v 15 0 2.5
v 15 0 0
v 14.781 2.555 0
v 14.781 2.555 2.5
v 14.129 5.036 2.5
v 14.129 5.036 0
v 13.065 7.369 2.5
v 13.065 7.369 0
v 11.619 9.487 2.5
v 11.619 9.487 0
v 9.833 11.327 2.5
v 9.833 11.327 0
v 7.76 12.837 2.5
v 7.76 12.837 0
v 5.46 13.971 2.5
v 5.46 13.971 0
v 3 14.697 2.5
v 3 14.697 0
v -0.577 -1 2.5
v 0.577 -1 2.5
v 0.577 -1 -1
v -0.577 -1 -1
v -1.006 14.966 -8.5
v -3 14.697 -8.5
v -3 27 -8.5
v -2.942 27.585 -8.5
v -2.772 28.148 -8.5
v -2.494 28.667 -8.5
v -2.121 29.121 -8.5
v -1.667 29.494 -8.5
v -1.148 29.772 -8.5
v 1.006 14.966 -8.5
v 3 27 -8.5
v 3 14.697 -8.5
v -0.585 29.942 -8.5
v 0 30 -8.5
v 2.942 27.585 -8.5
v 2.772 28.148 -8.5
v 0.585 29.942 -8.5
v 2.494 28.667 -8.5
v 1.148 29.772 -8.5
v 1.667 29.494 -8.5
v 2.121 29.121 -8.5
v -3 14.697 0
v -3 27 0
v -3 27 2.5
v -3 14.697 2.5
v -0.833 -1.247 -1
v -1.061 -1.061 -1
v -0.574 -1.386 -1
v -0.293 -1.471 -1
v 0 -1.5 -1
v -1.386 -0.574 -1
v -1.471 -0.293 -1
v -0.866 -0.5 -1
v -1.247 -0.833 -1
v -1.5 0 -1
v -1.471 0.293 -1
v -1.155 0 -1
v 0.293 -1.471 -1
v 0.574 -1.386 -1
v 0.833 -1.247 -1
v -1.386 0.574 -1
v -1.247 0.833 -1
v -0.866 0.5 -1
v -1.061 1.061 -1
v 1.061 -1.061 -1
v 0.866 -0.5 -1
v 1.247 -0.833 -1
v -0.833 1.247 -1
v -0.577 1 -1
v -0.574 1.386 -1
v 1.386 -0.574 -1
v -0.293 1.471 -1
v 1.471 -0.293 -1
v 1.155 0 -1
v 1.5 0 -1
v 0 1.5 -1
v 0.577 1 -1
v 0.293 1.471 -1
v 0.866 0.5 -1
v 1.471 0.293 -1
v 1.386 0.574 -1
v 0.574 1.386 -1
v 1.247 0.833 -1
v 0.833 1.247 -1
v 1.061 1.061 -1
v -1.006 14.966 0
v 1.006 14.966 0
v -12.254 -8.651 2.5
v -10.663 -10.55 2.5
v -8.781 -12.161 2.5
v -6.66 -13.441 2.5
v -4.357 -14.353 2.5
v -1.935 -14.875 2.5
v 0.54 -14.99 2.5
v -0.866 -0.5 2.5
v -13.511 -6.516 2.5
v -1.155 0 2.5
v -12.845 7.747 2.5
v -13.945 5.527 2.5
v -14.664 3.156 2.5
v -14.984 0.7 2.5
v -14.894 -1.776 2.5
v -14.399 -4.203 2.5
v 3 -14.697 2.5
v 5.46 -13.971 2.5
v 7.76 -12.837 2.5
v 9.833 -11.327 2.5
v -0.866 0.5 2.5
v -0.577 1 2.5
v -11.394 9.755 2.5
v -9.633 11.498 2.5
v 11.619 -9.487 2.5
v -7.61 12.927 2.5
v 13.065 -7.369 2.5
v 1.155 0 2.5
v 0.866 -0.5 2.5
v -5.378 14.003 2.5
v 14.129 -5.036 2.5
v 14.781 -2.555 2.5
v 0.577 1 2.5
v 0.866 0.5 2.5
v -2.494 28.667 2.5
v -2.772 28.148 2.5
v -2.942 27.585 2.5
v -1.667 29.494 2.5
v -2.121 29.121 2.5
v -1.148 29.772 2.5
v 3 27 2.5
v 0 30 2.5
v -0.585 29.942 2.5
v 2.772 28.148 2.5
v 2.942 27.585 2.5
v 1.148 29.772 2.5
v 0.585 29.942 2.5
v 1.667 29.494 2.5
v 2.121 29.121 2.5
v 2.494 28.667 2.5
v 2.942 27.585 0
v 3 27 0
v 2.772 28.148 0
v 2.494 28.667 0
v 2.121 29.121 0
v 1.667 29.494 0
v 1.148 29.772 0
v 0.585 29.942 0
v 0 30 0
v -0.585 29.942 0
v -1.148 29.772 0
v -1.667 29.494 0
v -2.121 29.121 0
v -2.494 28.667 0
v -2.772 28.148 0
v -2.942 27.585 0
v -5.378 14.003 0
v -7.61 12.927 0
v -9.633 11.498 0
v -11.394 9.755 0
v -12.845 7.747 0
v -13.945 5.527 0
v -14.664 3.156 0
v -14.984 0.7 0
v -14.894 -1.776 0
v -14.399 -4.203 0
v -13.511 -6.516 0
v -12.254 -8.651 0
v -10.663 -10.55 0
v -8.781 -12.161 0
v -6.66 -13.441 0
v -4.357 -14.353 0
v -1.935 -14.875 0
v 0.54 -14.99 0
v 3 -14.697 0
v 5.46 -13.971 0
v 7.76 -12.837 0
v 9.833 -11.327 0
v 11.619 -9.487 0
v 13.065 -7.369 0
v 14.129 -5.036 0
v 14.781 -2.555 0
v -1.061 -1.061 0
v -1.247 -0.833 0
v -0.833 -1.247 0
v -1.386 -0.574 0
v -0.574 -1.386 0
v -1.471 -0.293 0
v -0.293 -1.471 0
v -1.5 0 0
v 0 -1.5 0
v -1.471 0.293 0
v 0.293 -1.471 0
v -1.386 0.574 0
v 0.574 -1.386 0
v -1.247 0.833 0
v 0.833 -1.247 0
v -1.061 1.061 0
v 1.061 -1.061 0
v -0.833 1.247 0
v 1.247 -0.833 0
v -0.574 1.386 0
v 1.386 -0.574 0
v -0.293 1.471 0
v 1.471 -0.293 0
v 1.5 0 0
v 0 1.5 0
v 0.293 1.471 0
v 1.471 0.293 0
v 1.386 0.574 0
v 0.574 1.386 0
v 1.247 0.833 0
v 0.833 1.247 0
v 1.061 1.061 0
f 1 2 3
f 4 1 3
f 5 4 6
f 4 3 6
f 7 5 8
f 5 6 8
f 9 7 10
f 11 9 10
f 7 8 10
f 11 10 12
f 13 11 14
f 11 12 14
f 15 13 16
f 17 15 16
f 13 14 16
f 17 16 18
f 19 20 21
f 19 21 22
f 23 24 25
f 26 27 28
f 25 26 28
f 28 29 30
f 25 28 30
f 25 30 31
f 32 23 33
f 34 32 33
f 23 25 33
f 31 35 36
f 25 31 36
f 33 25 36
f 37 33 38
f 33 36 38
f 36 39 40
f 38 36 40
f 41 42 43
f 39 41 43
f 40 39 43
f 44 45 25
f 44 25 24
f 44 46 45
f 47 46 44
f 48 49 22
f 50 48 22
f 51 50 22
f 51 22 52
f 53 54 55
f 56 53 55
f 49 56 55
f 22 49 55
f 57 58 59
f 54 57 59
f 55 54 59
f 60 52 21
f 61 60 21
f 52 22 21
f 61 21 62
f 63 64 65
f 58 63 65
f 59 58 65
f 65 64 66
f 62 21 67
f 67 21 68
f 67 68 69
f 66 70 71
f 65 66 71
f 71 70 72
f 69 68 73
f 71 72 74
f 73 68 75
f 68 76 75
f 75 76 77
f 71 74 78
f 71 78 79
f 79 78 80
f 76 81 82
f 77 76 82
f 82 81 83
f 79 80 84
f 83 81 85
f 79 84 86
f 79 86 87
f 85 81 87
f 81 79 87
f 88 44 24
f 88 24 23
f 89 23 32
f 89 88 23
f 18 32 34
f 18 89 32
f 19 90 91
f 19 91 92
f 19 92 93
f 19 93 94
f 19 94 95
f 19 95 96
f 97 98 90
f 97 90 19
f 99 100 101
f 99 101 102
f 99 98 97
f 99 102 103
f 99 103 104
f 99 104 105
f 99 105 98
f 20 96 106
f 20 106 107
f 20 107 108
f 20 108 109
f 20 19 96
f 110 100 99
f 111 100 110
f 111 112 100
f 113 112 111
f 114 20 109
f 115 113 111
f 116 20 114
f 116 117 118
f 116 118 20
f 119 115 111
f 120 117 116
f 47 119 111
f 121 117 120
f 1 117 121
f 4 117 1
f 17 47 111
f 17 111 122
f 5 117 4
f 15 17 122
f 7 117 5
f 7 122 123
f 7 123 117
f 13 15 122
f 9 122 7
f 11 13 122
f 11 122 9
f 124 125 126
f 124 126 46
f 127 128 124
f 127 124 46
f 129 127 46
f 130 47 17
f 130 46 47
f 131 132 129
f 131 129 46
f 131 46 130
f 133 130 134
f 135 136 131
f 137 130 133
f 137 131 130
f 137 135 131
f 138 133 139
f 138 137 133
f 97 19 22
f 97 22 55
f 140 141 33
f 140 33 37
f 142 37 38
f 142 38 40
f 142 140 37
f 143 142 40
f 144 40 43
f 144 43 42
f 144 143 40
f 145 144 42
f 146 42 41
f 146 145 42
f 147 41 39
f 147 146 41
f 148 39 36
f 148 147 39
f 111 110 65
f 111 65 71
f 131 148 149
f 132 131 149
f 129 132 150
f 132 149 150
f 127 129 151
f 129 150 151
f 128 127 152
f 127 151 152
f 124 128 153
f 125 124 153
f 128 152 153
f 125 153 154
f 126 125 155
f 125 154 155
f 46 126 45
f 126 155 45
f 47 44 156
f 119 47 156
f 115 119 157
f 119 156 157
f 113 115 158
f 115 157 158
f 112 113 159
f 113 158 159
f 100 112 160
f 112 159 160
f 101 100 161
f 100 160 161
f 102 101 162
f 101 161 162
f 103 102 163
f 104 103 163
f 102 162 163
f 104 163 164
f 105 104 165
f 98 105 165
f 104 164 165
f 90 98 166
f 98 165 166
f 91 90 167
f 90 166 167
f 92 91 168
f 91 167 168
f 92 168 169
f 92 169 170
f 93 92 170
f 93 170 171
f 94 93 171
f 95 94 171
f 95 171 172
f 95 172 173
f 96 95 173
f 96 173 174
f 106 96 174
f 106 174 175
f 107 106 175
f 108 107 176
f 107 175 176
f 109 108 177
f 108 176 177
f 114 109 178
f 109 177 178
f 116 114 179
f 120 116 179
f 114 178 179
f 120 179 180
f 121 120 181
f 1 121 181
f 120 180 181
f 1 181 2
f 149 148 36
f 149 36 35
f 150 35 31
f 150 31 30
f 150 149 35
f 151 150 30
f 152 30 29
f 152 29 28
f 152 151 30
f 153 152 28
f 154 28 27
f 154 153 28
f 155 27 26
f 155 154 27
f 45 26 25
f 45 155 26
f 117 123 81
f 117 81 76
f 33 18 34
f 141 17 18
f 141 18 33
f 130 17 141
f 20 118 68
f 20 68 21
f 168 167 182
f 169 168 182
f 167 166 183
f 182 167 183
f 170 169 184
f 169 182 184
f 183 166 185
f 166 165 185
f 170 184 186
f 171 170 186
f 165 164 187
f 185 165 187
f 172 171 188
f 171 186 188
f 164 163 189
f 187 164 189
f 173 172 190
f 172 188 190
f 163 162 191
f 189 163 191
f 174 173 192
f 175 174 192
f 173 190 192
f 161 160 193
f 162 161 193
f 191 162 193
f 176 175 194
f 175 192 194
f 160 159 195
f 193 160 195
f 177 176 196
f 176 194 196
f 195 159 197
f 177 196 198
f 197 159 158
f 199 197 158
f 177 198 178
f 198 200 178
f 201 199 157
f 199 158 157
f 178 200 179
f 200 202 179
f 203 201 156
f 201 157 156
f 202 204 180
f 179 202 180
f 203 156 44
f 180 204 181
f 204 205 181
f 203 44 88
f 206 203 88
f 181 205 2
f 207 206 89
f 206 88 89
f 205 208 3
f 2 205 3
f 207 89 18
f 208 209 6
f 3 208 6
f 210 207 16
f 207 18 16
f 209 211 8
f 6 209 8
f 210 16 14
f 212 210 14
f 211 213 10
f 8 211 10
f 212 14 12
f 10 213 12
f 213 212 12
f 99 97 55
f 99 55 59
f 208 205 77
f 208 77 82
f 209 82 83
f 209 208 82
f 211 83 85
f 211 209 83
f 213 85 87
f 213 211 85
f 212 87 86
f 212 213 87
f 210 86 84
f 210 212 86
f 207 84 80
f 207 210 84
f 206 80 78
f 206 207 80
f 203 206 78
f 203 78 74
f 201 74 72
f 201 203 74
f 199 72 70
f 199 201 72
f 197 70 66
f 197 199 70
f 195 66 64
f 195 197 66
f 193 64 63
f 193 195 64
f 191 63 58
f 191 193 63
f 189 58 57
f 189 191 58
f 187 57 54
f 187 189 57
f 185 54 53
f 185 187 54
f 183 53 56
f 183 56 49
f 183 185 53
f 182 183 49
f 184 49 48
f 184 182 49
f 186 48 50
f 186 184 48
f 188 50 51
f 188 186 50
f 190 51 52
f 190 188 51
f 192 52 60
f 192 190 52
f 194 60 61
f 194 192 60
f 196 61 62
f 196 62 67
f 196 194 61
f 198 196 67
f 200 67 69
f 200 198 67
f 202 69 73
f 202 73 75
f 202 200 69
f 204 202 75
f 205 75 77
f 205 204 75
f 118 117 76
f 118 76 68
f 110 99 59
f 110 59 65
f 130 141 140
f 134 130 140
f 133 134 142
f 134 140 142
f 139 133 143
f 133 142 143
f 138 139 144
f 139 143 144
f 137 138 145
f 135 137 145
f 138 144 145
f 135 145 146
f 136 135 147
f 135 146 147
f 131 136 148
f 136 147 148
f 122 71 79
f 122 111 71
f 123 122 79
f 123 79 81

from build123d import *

# Parameters (mm, degrees)
F0_R     = 1.5
F1_DEPTH = 2.5
F2_DEPTH = 8.5
F3_DEPTH = 1


with BuildPart() as f1:
    # F0 (on Top) → F1 (new body)
    with BuildSketch(Plane.XY):
        with BuildLine():
            Line((-3, -14.6969384567), (-3, 14.6969384567))
            ThreePointArc((-3, 14.6969384567), (-15, 0), (-3, -14.6969384567))
        make_face()
        with BuildLine():
            Line((3, -14.6969384567), (3, 14.6969384567))
            ThreePointArc((3, 14.6969384567), (0, 15), (-3, 14.6969384567))
            Line((-3, 14.6969384567), (-3, -14.6969384567))
            ThreePointArc((-3, -14.6969384567), (0, -15), (3, -14.6969384567))
        make_face()
        Circle(F0_R, mode=Mode.SUBTRACT)
        with BuildLine():
            ThreePointArc((3, -14.6969384567), (11.6189500386, -9.4868329805), (15, 0))
            ThreePointArc((15, 0), (11.6189500386, 9.4868329805), (3, 14.6969384567))
            Line((3, 14.6969384567), (3, -14.6969384567))
        make_face()
        with BuildLine():
            ThreePointArc((-3, 14.6969384567), (0, 15), (3, 14.6969384567))
            Line((3, 14.6969384567), (3, 27))
            ThreePointArc((3, 27), (2.1213203436, 29.1213203436), (0, 30))
            ThreePointArc((0, 30), (-2.1213203436, 29.1213203436), (-3, 27))
            Line((-3, 27), (-3, 14.6969384567))
        make_face()
        Circle(F0_R)
        Polygon((0.5773502692, 1), (0.8660253864, 0.5000000301), (1.1547005384, 0), (0.8660253864, -0.5000000301), (0.5773502692, -1), (0, -1), (-0.5773502692, -1), (-0.8660253838, -0.5000000347), (-1.1547005384, 0), (-0.866025389, 0.5000000256), (-0.5773502692, 1), (0, 1), align=None, mode=Mode.SUBTRACT)
    extrude(amount=F1_DEPTH)

    # F0 (on Top) → F2 (join)
    with BuildSketch(Plane.XY):
        with BuildLine():
            ThreePointArc((-3, 14.6969384567), (0, 15), (3, 14.6969384567))
            Line((3, 14.6969384567), (3, 27))
            ThreePointArc((3, 27), (2.1213203436, 29.1213203436), (0, 30))
            ThreePointArc((0, 30), (-2.1213203436, 29.1213203436), (-3, 27))
            Line((-3, 27), (-3, 14.6969384567))
        make_face()
    extrude(amount=-F2_DEPTH)

    # F0 (on Top) → F3 (join)
    with BuildSketch(Plane.XY):
        Circle(F0_R)
        Polygon((0.5773502692, 1), (0.8660253864, 0.5000000301), (1.1547005384, 0), (0.8660253864, -0.5000000301), (0.5773502692, -1), (0, -1), (-0.5773502692, -1), (-0.8660253838, -0.5000000347), (-1.1547005384, 0), (-0.866025389, 0.5000000256), (-0.5773502692, 1), (0, 1), align=None, mode=Mode.SUBTRACT)
    extrude(amount=-F3_DEPTH)


solid = f1.part
